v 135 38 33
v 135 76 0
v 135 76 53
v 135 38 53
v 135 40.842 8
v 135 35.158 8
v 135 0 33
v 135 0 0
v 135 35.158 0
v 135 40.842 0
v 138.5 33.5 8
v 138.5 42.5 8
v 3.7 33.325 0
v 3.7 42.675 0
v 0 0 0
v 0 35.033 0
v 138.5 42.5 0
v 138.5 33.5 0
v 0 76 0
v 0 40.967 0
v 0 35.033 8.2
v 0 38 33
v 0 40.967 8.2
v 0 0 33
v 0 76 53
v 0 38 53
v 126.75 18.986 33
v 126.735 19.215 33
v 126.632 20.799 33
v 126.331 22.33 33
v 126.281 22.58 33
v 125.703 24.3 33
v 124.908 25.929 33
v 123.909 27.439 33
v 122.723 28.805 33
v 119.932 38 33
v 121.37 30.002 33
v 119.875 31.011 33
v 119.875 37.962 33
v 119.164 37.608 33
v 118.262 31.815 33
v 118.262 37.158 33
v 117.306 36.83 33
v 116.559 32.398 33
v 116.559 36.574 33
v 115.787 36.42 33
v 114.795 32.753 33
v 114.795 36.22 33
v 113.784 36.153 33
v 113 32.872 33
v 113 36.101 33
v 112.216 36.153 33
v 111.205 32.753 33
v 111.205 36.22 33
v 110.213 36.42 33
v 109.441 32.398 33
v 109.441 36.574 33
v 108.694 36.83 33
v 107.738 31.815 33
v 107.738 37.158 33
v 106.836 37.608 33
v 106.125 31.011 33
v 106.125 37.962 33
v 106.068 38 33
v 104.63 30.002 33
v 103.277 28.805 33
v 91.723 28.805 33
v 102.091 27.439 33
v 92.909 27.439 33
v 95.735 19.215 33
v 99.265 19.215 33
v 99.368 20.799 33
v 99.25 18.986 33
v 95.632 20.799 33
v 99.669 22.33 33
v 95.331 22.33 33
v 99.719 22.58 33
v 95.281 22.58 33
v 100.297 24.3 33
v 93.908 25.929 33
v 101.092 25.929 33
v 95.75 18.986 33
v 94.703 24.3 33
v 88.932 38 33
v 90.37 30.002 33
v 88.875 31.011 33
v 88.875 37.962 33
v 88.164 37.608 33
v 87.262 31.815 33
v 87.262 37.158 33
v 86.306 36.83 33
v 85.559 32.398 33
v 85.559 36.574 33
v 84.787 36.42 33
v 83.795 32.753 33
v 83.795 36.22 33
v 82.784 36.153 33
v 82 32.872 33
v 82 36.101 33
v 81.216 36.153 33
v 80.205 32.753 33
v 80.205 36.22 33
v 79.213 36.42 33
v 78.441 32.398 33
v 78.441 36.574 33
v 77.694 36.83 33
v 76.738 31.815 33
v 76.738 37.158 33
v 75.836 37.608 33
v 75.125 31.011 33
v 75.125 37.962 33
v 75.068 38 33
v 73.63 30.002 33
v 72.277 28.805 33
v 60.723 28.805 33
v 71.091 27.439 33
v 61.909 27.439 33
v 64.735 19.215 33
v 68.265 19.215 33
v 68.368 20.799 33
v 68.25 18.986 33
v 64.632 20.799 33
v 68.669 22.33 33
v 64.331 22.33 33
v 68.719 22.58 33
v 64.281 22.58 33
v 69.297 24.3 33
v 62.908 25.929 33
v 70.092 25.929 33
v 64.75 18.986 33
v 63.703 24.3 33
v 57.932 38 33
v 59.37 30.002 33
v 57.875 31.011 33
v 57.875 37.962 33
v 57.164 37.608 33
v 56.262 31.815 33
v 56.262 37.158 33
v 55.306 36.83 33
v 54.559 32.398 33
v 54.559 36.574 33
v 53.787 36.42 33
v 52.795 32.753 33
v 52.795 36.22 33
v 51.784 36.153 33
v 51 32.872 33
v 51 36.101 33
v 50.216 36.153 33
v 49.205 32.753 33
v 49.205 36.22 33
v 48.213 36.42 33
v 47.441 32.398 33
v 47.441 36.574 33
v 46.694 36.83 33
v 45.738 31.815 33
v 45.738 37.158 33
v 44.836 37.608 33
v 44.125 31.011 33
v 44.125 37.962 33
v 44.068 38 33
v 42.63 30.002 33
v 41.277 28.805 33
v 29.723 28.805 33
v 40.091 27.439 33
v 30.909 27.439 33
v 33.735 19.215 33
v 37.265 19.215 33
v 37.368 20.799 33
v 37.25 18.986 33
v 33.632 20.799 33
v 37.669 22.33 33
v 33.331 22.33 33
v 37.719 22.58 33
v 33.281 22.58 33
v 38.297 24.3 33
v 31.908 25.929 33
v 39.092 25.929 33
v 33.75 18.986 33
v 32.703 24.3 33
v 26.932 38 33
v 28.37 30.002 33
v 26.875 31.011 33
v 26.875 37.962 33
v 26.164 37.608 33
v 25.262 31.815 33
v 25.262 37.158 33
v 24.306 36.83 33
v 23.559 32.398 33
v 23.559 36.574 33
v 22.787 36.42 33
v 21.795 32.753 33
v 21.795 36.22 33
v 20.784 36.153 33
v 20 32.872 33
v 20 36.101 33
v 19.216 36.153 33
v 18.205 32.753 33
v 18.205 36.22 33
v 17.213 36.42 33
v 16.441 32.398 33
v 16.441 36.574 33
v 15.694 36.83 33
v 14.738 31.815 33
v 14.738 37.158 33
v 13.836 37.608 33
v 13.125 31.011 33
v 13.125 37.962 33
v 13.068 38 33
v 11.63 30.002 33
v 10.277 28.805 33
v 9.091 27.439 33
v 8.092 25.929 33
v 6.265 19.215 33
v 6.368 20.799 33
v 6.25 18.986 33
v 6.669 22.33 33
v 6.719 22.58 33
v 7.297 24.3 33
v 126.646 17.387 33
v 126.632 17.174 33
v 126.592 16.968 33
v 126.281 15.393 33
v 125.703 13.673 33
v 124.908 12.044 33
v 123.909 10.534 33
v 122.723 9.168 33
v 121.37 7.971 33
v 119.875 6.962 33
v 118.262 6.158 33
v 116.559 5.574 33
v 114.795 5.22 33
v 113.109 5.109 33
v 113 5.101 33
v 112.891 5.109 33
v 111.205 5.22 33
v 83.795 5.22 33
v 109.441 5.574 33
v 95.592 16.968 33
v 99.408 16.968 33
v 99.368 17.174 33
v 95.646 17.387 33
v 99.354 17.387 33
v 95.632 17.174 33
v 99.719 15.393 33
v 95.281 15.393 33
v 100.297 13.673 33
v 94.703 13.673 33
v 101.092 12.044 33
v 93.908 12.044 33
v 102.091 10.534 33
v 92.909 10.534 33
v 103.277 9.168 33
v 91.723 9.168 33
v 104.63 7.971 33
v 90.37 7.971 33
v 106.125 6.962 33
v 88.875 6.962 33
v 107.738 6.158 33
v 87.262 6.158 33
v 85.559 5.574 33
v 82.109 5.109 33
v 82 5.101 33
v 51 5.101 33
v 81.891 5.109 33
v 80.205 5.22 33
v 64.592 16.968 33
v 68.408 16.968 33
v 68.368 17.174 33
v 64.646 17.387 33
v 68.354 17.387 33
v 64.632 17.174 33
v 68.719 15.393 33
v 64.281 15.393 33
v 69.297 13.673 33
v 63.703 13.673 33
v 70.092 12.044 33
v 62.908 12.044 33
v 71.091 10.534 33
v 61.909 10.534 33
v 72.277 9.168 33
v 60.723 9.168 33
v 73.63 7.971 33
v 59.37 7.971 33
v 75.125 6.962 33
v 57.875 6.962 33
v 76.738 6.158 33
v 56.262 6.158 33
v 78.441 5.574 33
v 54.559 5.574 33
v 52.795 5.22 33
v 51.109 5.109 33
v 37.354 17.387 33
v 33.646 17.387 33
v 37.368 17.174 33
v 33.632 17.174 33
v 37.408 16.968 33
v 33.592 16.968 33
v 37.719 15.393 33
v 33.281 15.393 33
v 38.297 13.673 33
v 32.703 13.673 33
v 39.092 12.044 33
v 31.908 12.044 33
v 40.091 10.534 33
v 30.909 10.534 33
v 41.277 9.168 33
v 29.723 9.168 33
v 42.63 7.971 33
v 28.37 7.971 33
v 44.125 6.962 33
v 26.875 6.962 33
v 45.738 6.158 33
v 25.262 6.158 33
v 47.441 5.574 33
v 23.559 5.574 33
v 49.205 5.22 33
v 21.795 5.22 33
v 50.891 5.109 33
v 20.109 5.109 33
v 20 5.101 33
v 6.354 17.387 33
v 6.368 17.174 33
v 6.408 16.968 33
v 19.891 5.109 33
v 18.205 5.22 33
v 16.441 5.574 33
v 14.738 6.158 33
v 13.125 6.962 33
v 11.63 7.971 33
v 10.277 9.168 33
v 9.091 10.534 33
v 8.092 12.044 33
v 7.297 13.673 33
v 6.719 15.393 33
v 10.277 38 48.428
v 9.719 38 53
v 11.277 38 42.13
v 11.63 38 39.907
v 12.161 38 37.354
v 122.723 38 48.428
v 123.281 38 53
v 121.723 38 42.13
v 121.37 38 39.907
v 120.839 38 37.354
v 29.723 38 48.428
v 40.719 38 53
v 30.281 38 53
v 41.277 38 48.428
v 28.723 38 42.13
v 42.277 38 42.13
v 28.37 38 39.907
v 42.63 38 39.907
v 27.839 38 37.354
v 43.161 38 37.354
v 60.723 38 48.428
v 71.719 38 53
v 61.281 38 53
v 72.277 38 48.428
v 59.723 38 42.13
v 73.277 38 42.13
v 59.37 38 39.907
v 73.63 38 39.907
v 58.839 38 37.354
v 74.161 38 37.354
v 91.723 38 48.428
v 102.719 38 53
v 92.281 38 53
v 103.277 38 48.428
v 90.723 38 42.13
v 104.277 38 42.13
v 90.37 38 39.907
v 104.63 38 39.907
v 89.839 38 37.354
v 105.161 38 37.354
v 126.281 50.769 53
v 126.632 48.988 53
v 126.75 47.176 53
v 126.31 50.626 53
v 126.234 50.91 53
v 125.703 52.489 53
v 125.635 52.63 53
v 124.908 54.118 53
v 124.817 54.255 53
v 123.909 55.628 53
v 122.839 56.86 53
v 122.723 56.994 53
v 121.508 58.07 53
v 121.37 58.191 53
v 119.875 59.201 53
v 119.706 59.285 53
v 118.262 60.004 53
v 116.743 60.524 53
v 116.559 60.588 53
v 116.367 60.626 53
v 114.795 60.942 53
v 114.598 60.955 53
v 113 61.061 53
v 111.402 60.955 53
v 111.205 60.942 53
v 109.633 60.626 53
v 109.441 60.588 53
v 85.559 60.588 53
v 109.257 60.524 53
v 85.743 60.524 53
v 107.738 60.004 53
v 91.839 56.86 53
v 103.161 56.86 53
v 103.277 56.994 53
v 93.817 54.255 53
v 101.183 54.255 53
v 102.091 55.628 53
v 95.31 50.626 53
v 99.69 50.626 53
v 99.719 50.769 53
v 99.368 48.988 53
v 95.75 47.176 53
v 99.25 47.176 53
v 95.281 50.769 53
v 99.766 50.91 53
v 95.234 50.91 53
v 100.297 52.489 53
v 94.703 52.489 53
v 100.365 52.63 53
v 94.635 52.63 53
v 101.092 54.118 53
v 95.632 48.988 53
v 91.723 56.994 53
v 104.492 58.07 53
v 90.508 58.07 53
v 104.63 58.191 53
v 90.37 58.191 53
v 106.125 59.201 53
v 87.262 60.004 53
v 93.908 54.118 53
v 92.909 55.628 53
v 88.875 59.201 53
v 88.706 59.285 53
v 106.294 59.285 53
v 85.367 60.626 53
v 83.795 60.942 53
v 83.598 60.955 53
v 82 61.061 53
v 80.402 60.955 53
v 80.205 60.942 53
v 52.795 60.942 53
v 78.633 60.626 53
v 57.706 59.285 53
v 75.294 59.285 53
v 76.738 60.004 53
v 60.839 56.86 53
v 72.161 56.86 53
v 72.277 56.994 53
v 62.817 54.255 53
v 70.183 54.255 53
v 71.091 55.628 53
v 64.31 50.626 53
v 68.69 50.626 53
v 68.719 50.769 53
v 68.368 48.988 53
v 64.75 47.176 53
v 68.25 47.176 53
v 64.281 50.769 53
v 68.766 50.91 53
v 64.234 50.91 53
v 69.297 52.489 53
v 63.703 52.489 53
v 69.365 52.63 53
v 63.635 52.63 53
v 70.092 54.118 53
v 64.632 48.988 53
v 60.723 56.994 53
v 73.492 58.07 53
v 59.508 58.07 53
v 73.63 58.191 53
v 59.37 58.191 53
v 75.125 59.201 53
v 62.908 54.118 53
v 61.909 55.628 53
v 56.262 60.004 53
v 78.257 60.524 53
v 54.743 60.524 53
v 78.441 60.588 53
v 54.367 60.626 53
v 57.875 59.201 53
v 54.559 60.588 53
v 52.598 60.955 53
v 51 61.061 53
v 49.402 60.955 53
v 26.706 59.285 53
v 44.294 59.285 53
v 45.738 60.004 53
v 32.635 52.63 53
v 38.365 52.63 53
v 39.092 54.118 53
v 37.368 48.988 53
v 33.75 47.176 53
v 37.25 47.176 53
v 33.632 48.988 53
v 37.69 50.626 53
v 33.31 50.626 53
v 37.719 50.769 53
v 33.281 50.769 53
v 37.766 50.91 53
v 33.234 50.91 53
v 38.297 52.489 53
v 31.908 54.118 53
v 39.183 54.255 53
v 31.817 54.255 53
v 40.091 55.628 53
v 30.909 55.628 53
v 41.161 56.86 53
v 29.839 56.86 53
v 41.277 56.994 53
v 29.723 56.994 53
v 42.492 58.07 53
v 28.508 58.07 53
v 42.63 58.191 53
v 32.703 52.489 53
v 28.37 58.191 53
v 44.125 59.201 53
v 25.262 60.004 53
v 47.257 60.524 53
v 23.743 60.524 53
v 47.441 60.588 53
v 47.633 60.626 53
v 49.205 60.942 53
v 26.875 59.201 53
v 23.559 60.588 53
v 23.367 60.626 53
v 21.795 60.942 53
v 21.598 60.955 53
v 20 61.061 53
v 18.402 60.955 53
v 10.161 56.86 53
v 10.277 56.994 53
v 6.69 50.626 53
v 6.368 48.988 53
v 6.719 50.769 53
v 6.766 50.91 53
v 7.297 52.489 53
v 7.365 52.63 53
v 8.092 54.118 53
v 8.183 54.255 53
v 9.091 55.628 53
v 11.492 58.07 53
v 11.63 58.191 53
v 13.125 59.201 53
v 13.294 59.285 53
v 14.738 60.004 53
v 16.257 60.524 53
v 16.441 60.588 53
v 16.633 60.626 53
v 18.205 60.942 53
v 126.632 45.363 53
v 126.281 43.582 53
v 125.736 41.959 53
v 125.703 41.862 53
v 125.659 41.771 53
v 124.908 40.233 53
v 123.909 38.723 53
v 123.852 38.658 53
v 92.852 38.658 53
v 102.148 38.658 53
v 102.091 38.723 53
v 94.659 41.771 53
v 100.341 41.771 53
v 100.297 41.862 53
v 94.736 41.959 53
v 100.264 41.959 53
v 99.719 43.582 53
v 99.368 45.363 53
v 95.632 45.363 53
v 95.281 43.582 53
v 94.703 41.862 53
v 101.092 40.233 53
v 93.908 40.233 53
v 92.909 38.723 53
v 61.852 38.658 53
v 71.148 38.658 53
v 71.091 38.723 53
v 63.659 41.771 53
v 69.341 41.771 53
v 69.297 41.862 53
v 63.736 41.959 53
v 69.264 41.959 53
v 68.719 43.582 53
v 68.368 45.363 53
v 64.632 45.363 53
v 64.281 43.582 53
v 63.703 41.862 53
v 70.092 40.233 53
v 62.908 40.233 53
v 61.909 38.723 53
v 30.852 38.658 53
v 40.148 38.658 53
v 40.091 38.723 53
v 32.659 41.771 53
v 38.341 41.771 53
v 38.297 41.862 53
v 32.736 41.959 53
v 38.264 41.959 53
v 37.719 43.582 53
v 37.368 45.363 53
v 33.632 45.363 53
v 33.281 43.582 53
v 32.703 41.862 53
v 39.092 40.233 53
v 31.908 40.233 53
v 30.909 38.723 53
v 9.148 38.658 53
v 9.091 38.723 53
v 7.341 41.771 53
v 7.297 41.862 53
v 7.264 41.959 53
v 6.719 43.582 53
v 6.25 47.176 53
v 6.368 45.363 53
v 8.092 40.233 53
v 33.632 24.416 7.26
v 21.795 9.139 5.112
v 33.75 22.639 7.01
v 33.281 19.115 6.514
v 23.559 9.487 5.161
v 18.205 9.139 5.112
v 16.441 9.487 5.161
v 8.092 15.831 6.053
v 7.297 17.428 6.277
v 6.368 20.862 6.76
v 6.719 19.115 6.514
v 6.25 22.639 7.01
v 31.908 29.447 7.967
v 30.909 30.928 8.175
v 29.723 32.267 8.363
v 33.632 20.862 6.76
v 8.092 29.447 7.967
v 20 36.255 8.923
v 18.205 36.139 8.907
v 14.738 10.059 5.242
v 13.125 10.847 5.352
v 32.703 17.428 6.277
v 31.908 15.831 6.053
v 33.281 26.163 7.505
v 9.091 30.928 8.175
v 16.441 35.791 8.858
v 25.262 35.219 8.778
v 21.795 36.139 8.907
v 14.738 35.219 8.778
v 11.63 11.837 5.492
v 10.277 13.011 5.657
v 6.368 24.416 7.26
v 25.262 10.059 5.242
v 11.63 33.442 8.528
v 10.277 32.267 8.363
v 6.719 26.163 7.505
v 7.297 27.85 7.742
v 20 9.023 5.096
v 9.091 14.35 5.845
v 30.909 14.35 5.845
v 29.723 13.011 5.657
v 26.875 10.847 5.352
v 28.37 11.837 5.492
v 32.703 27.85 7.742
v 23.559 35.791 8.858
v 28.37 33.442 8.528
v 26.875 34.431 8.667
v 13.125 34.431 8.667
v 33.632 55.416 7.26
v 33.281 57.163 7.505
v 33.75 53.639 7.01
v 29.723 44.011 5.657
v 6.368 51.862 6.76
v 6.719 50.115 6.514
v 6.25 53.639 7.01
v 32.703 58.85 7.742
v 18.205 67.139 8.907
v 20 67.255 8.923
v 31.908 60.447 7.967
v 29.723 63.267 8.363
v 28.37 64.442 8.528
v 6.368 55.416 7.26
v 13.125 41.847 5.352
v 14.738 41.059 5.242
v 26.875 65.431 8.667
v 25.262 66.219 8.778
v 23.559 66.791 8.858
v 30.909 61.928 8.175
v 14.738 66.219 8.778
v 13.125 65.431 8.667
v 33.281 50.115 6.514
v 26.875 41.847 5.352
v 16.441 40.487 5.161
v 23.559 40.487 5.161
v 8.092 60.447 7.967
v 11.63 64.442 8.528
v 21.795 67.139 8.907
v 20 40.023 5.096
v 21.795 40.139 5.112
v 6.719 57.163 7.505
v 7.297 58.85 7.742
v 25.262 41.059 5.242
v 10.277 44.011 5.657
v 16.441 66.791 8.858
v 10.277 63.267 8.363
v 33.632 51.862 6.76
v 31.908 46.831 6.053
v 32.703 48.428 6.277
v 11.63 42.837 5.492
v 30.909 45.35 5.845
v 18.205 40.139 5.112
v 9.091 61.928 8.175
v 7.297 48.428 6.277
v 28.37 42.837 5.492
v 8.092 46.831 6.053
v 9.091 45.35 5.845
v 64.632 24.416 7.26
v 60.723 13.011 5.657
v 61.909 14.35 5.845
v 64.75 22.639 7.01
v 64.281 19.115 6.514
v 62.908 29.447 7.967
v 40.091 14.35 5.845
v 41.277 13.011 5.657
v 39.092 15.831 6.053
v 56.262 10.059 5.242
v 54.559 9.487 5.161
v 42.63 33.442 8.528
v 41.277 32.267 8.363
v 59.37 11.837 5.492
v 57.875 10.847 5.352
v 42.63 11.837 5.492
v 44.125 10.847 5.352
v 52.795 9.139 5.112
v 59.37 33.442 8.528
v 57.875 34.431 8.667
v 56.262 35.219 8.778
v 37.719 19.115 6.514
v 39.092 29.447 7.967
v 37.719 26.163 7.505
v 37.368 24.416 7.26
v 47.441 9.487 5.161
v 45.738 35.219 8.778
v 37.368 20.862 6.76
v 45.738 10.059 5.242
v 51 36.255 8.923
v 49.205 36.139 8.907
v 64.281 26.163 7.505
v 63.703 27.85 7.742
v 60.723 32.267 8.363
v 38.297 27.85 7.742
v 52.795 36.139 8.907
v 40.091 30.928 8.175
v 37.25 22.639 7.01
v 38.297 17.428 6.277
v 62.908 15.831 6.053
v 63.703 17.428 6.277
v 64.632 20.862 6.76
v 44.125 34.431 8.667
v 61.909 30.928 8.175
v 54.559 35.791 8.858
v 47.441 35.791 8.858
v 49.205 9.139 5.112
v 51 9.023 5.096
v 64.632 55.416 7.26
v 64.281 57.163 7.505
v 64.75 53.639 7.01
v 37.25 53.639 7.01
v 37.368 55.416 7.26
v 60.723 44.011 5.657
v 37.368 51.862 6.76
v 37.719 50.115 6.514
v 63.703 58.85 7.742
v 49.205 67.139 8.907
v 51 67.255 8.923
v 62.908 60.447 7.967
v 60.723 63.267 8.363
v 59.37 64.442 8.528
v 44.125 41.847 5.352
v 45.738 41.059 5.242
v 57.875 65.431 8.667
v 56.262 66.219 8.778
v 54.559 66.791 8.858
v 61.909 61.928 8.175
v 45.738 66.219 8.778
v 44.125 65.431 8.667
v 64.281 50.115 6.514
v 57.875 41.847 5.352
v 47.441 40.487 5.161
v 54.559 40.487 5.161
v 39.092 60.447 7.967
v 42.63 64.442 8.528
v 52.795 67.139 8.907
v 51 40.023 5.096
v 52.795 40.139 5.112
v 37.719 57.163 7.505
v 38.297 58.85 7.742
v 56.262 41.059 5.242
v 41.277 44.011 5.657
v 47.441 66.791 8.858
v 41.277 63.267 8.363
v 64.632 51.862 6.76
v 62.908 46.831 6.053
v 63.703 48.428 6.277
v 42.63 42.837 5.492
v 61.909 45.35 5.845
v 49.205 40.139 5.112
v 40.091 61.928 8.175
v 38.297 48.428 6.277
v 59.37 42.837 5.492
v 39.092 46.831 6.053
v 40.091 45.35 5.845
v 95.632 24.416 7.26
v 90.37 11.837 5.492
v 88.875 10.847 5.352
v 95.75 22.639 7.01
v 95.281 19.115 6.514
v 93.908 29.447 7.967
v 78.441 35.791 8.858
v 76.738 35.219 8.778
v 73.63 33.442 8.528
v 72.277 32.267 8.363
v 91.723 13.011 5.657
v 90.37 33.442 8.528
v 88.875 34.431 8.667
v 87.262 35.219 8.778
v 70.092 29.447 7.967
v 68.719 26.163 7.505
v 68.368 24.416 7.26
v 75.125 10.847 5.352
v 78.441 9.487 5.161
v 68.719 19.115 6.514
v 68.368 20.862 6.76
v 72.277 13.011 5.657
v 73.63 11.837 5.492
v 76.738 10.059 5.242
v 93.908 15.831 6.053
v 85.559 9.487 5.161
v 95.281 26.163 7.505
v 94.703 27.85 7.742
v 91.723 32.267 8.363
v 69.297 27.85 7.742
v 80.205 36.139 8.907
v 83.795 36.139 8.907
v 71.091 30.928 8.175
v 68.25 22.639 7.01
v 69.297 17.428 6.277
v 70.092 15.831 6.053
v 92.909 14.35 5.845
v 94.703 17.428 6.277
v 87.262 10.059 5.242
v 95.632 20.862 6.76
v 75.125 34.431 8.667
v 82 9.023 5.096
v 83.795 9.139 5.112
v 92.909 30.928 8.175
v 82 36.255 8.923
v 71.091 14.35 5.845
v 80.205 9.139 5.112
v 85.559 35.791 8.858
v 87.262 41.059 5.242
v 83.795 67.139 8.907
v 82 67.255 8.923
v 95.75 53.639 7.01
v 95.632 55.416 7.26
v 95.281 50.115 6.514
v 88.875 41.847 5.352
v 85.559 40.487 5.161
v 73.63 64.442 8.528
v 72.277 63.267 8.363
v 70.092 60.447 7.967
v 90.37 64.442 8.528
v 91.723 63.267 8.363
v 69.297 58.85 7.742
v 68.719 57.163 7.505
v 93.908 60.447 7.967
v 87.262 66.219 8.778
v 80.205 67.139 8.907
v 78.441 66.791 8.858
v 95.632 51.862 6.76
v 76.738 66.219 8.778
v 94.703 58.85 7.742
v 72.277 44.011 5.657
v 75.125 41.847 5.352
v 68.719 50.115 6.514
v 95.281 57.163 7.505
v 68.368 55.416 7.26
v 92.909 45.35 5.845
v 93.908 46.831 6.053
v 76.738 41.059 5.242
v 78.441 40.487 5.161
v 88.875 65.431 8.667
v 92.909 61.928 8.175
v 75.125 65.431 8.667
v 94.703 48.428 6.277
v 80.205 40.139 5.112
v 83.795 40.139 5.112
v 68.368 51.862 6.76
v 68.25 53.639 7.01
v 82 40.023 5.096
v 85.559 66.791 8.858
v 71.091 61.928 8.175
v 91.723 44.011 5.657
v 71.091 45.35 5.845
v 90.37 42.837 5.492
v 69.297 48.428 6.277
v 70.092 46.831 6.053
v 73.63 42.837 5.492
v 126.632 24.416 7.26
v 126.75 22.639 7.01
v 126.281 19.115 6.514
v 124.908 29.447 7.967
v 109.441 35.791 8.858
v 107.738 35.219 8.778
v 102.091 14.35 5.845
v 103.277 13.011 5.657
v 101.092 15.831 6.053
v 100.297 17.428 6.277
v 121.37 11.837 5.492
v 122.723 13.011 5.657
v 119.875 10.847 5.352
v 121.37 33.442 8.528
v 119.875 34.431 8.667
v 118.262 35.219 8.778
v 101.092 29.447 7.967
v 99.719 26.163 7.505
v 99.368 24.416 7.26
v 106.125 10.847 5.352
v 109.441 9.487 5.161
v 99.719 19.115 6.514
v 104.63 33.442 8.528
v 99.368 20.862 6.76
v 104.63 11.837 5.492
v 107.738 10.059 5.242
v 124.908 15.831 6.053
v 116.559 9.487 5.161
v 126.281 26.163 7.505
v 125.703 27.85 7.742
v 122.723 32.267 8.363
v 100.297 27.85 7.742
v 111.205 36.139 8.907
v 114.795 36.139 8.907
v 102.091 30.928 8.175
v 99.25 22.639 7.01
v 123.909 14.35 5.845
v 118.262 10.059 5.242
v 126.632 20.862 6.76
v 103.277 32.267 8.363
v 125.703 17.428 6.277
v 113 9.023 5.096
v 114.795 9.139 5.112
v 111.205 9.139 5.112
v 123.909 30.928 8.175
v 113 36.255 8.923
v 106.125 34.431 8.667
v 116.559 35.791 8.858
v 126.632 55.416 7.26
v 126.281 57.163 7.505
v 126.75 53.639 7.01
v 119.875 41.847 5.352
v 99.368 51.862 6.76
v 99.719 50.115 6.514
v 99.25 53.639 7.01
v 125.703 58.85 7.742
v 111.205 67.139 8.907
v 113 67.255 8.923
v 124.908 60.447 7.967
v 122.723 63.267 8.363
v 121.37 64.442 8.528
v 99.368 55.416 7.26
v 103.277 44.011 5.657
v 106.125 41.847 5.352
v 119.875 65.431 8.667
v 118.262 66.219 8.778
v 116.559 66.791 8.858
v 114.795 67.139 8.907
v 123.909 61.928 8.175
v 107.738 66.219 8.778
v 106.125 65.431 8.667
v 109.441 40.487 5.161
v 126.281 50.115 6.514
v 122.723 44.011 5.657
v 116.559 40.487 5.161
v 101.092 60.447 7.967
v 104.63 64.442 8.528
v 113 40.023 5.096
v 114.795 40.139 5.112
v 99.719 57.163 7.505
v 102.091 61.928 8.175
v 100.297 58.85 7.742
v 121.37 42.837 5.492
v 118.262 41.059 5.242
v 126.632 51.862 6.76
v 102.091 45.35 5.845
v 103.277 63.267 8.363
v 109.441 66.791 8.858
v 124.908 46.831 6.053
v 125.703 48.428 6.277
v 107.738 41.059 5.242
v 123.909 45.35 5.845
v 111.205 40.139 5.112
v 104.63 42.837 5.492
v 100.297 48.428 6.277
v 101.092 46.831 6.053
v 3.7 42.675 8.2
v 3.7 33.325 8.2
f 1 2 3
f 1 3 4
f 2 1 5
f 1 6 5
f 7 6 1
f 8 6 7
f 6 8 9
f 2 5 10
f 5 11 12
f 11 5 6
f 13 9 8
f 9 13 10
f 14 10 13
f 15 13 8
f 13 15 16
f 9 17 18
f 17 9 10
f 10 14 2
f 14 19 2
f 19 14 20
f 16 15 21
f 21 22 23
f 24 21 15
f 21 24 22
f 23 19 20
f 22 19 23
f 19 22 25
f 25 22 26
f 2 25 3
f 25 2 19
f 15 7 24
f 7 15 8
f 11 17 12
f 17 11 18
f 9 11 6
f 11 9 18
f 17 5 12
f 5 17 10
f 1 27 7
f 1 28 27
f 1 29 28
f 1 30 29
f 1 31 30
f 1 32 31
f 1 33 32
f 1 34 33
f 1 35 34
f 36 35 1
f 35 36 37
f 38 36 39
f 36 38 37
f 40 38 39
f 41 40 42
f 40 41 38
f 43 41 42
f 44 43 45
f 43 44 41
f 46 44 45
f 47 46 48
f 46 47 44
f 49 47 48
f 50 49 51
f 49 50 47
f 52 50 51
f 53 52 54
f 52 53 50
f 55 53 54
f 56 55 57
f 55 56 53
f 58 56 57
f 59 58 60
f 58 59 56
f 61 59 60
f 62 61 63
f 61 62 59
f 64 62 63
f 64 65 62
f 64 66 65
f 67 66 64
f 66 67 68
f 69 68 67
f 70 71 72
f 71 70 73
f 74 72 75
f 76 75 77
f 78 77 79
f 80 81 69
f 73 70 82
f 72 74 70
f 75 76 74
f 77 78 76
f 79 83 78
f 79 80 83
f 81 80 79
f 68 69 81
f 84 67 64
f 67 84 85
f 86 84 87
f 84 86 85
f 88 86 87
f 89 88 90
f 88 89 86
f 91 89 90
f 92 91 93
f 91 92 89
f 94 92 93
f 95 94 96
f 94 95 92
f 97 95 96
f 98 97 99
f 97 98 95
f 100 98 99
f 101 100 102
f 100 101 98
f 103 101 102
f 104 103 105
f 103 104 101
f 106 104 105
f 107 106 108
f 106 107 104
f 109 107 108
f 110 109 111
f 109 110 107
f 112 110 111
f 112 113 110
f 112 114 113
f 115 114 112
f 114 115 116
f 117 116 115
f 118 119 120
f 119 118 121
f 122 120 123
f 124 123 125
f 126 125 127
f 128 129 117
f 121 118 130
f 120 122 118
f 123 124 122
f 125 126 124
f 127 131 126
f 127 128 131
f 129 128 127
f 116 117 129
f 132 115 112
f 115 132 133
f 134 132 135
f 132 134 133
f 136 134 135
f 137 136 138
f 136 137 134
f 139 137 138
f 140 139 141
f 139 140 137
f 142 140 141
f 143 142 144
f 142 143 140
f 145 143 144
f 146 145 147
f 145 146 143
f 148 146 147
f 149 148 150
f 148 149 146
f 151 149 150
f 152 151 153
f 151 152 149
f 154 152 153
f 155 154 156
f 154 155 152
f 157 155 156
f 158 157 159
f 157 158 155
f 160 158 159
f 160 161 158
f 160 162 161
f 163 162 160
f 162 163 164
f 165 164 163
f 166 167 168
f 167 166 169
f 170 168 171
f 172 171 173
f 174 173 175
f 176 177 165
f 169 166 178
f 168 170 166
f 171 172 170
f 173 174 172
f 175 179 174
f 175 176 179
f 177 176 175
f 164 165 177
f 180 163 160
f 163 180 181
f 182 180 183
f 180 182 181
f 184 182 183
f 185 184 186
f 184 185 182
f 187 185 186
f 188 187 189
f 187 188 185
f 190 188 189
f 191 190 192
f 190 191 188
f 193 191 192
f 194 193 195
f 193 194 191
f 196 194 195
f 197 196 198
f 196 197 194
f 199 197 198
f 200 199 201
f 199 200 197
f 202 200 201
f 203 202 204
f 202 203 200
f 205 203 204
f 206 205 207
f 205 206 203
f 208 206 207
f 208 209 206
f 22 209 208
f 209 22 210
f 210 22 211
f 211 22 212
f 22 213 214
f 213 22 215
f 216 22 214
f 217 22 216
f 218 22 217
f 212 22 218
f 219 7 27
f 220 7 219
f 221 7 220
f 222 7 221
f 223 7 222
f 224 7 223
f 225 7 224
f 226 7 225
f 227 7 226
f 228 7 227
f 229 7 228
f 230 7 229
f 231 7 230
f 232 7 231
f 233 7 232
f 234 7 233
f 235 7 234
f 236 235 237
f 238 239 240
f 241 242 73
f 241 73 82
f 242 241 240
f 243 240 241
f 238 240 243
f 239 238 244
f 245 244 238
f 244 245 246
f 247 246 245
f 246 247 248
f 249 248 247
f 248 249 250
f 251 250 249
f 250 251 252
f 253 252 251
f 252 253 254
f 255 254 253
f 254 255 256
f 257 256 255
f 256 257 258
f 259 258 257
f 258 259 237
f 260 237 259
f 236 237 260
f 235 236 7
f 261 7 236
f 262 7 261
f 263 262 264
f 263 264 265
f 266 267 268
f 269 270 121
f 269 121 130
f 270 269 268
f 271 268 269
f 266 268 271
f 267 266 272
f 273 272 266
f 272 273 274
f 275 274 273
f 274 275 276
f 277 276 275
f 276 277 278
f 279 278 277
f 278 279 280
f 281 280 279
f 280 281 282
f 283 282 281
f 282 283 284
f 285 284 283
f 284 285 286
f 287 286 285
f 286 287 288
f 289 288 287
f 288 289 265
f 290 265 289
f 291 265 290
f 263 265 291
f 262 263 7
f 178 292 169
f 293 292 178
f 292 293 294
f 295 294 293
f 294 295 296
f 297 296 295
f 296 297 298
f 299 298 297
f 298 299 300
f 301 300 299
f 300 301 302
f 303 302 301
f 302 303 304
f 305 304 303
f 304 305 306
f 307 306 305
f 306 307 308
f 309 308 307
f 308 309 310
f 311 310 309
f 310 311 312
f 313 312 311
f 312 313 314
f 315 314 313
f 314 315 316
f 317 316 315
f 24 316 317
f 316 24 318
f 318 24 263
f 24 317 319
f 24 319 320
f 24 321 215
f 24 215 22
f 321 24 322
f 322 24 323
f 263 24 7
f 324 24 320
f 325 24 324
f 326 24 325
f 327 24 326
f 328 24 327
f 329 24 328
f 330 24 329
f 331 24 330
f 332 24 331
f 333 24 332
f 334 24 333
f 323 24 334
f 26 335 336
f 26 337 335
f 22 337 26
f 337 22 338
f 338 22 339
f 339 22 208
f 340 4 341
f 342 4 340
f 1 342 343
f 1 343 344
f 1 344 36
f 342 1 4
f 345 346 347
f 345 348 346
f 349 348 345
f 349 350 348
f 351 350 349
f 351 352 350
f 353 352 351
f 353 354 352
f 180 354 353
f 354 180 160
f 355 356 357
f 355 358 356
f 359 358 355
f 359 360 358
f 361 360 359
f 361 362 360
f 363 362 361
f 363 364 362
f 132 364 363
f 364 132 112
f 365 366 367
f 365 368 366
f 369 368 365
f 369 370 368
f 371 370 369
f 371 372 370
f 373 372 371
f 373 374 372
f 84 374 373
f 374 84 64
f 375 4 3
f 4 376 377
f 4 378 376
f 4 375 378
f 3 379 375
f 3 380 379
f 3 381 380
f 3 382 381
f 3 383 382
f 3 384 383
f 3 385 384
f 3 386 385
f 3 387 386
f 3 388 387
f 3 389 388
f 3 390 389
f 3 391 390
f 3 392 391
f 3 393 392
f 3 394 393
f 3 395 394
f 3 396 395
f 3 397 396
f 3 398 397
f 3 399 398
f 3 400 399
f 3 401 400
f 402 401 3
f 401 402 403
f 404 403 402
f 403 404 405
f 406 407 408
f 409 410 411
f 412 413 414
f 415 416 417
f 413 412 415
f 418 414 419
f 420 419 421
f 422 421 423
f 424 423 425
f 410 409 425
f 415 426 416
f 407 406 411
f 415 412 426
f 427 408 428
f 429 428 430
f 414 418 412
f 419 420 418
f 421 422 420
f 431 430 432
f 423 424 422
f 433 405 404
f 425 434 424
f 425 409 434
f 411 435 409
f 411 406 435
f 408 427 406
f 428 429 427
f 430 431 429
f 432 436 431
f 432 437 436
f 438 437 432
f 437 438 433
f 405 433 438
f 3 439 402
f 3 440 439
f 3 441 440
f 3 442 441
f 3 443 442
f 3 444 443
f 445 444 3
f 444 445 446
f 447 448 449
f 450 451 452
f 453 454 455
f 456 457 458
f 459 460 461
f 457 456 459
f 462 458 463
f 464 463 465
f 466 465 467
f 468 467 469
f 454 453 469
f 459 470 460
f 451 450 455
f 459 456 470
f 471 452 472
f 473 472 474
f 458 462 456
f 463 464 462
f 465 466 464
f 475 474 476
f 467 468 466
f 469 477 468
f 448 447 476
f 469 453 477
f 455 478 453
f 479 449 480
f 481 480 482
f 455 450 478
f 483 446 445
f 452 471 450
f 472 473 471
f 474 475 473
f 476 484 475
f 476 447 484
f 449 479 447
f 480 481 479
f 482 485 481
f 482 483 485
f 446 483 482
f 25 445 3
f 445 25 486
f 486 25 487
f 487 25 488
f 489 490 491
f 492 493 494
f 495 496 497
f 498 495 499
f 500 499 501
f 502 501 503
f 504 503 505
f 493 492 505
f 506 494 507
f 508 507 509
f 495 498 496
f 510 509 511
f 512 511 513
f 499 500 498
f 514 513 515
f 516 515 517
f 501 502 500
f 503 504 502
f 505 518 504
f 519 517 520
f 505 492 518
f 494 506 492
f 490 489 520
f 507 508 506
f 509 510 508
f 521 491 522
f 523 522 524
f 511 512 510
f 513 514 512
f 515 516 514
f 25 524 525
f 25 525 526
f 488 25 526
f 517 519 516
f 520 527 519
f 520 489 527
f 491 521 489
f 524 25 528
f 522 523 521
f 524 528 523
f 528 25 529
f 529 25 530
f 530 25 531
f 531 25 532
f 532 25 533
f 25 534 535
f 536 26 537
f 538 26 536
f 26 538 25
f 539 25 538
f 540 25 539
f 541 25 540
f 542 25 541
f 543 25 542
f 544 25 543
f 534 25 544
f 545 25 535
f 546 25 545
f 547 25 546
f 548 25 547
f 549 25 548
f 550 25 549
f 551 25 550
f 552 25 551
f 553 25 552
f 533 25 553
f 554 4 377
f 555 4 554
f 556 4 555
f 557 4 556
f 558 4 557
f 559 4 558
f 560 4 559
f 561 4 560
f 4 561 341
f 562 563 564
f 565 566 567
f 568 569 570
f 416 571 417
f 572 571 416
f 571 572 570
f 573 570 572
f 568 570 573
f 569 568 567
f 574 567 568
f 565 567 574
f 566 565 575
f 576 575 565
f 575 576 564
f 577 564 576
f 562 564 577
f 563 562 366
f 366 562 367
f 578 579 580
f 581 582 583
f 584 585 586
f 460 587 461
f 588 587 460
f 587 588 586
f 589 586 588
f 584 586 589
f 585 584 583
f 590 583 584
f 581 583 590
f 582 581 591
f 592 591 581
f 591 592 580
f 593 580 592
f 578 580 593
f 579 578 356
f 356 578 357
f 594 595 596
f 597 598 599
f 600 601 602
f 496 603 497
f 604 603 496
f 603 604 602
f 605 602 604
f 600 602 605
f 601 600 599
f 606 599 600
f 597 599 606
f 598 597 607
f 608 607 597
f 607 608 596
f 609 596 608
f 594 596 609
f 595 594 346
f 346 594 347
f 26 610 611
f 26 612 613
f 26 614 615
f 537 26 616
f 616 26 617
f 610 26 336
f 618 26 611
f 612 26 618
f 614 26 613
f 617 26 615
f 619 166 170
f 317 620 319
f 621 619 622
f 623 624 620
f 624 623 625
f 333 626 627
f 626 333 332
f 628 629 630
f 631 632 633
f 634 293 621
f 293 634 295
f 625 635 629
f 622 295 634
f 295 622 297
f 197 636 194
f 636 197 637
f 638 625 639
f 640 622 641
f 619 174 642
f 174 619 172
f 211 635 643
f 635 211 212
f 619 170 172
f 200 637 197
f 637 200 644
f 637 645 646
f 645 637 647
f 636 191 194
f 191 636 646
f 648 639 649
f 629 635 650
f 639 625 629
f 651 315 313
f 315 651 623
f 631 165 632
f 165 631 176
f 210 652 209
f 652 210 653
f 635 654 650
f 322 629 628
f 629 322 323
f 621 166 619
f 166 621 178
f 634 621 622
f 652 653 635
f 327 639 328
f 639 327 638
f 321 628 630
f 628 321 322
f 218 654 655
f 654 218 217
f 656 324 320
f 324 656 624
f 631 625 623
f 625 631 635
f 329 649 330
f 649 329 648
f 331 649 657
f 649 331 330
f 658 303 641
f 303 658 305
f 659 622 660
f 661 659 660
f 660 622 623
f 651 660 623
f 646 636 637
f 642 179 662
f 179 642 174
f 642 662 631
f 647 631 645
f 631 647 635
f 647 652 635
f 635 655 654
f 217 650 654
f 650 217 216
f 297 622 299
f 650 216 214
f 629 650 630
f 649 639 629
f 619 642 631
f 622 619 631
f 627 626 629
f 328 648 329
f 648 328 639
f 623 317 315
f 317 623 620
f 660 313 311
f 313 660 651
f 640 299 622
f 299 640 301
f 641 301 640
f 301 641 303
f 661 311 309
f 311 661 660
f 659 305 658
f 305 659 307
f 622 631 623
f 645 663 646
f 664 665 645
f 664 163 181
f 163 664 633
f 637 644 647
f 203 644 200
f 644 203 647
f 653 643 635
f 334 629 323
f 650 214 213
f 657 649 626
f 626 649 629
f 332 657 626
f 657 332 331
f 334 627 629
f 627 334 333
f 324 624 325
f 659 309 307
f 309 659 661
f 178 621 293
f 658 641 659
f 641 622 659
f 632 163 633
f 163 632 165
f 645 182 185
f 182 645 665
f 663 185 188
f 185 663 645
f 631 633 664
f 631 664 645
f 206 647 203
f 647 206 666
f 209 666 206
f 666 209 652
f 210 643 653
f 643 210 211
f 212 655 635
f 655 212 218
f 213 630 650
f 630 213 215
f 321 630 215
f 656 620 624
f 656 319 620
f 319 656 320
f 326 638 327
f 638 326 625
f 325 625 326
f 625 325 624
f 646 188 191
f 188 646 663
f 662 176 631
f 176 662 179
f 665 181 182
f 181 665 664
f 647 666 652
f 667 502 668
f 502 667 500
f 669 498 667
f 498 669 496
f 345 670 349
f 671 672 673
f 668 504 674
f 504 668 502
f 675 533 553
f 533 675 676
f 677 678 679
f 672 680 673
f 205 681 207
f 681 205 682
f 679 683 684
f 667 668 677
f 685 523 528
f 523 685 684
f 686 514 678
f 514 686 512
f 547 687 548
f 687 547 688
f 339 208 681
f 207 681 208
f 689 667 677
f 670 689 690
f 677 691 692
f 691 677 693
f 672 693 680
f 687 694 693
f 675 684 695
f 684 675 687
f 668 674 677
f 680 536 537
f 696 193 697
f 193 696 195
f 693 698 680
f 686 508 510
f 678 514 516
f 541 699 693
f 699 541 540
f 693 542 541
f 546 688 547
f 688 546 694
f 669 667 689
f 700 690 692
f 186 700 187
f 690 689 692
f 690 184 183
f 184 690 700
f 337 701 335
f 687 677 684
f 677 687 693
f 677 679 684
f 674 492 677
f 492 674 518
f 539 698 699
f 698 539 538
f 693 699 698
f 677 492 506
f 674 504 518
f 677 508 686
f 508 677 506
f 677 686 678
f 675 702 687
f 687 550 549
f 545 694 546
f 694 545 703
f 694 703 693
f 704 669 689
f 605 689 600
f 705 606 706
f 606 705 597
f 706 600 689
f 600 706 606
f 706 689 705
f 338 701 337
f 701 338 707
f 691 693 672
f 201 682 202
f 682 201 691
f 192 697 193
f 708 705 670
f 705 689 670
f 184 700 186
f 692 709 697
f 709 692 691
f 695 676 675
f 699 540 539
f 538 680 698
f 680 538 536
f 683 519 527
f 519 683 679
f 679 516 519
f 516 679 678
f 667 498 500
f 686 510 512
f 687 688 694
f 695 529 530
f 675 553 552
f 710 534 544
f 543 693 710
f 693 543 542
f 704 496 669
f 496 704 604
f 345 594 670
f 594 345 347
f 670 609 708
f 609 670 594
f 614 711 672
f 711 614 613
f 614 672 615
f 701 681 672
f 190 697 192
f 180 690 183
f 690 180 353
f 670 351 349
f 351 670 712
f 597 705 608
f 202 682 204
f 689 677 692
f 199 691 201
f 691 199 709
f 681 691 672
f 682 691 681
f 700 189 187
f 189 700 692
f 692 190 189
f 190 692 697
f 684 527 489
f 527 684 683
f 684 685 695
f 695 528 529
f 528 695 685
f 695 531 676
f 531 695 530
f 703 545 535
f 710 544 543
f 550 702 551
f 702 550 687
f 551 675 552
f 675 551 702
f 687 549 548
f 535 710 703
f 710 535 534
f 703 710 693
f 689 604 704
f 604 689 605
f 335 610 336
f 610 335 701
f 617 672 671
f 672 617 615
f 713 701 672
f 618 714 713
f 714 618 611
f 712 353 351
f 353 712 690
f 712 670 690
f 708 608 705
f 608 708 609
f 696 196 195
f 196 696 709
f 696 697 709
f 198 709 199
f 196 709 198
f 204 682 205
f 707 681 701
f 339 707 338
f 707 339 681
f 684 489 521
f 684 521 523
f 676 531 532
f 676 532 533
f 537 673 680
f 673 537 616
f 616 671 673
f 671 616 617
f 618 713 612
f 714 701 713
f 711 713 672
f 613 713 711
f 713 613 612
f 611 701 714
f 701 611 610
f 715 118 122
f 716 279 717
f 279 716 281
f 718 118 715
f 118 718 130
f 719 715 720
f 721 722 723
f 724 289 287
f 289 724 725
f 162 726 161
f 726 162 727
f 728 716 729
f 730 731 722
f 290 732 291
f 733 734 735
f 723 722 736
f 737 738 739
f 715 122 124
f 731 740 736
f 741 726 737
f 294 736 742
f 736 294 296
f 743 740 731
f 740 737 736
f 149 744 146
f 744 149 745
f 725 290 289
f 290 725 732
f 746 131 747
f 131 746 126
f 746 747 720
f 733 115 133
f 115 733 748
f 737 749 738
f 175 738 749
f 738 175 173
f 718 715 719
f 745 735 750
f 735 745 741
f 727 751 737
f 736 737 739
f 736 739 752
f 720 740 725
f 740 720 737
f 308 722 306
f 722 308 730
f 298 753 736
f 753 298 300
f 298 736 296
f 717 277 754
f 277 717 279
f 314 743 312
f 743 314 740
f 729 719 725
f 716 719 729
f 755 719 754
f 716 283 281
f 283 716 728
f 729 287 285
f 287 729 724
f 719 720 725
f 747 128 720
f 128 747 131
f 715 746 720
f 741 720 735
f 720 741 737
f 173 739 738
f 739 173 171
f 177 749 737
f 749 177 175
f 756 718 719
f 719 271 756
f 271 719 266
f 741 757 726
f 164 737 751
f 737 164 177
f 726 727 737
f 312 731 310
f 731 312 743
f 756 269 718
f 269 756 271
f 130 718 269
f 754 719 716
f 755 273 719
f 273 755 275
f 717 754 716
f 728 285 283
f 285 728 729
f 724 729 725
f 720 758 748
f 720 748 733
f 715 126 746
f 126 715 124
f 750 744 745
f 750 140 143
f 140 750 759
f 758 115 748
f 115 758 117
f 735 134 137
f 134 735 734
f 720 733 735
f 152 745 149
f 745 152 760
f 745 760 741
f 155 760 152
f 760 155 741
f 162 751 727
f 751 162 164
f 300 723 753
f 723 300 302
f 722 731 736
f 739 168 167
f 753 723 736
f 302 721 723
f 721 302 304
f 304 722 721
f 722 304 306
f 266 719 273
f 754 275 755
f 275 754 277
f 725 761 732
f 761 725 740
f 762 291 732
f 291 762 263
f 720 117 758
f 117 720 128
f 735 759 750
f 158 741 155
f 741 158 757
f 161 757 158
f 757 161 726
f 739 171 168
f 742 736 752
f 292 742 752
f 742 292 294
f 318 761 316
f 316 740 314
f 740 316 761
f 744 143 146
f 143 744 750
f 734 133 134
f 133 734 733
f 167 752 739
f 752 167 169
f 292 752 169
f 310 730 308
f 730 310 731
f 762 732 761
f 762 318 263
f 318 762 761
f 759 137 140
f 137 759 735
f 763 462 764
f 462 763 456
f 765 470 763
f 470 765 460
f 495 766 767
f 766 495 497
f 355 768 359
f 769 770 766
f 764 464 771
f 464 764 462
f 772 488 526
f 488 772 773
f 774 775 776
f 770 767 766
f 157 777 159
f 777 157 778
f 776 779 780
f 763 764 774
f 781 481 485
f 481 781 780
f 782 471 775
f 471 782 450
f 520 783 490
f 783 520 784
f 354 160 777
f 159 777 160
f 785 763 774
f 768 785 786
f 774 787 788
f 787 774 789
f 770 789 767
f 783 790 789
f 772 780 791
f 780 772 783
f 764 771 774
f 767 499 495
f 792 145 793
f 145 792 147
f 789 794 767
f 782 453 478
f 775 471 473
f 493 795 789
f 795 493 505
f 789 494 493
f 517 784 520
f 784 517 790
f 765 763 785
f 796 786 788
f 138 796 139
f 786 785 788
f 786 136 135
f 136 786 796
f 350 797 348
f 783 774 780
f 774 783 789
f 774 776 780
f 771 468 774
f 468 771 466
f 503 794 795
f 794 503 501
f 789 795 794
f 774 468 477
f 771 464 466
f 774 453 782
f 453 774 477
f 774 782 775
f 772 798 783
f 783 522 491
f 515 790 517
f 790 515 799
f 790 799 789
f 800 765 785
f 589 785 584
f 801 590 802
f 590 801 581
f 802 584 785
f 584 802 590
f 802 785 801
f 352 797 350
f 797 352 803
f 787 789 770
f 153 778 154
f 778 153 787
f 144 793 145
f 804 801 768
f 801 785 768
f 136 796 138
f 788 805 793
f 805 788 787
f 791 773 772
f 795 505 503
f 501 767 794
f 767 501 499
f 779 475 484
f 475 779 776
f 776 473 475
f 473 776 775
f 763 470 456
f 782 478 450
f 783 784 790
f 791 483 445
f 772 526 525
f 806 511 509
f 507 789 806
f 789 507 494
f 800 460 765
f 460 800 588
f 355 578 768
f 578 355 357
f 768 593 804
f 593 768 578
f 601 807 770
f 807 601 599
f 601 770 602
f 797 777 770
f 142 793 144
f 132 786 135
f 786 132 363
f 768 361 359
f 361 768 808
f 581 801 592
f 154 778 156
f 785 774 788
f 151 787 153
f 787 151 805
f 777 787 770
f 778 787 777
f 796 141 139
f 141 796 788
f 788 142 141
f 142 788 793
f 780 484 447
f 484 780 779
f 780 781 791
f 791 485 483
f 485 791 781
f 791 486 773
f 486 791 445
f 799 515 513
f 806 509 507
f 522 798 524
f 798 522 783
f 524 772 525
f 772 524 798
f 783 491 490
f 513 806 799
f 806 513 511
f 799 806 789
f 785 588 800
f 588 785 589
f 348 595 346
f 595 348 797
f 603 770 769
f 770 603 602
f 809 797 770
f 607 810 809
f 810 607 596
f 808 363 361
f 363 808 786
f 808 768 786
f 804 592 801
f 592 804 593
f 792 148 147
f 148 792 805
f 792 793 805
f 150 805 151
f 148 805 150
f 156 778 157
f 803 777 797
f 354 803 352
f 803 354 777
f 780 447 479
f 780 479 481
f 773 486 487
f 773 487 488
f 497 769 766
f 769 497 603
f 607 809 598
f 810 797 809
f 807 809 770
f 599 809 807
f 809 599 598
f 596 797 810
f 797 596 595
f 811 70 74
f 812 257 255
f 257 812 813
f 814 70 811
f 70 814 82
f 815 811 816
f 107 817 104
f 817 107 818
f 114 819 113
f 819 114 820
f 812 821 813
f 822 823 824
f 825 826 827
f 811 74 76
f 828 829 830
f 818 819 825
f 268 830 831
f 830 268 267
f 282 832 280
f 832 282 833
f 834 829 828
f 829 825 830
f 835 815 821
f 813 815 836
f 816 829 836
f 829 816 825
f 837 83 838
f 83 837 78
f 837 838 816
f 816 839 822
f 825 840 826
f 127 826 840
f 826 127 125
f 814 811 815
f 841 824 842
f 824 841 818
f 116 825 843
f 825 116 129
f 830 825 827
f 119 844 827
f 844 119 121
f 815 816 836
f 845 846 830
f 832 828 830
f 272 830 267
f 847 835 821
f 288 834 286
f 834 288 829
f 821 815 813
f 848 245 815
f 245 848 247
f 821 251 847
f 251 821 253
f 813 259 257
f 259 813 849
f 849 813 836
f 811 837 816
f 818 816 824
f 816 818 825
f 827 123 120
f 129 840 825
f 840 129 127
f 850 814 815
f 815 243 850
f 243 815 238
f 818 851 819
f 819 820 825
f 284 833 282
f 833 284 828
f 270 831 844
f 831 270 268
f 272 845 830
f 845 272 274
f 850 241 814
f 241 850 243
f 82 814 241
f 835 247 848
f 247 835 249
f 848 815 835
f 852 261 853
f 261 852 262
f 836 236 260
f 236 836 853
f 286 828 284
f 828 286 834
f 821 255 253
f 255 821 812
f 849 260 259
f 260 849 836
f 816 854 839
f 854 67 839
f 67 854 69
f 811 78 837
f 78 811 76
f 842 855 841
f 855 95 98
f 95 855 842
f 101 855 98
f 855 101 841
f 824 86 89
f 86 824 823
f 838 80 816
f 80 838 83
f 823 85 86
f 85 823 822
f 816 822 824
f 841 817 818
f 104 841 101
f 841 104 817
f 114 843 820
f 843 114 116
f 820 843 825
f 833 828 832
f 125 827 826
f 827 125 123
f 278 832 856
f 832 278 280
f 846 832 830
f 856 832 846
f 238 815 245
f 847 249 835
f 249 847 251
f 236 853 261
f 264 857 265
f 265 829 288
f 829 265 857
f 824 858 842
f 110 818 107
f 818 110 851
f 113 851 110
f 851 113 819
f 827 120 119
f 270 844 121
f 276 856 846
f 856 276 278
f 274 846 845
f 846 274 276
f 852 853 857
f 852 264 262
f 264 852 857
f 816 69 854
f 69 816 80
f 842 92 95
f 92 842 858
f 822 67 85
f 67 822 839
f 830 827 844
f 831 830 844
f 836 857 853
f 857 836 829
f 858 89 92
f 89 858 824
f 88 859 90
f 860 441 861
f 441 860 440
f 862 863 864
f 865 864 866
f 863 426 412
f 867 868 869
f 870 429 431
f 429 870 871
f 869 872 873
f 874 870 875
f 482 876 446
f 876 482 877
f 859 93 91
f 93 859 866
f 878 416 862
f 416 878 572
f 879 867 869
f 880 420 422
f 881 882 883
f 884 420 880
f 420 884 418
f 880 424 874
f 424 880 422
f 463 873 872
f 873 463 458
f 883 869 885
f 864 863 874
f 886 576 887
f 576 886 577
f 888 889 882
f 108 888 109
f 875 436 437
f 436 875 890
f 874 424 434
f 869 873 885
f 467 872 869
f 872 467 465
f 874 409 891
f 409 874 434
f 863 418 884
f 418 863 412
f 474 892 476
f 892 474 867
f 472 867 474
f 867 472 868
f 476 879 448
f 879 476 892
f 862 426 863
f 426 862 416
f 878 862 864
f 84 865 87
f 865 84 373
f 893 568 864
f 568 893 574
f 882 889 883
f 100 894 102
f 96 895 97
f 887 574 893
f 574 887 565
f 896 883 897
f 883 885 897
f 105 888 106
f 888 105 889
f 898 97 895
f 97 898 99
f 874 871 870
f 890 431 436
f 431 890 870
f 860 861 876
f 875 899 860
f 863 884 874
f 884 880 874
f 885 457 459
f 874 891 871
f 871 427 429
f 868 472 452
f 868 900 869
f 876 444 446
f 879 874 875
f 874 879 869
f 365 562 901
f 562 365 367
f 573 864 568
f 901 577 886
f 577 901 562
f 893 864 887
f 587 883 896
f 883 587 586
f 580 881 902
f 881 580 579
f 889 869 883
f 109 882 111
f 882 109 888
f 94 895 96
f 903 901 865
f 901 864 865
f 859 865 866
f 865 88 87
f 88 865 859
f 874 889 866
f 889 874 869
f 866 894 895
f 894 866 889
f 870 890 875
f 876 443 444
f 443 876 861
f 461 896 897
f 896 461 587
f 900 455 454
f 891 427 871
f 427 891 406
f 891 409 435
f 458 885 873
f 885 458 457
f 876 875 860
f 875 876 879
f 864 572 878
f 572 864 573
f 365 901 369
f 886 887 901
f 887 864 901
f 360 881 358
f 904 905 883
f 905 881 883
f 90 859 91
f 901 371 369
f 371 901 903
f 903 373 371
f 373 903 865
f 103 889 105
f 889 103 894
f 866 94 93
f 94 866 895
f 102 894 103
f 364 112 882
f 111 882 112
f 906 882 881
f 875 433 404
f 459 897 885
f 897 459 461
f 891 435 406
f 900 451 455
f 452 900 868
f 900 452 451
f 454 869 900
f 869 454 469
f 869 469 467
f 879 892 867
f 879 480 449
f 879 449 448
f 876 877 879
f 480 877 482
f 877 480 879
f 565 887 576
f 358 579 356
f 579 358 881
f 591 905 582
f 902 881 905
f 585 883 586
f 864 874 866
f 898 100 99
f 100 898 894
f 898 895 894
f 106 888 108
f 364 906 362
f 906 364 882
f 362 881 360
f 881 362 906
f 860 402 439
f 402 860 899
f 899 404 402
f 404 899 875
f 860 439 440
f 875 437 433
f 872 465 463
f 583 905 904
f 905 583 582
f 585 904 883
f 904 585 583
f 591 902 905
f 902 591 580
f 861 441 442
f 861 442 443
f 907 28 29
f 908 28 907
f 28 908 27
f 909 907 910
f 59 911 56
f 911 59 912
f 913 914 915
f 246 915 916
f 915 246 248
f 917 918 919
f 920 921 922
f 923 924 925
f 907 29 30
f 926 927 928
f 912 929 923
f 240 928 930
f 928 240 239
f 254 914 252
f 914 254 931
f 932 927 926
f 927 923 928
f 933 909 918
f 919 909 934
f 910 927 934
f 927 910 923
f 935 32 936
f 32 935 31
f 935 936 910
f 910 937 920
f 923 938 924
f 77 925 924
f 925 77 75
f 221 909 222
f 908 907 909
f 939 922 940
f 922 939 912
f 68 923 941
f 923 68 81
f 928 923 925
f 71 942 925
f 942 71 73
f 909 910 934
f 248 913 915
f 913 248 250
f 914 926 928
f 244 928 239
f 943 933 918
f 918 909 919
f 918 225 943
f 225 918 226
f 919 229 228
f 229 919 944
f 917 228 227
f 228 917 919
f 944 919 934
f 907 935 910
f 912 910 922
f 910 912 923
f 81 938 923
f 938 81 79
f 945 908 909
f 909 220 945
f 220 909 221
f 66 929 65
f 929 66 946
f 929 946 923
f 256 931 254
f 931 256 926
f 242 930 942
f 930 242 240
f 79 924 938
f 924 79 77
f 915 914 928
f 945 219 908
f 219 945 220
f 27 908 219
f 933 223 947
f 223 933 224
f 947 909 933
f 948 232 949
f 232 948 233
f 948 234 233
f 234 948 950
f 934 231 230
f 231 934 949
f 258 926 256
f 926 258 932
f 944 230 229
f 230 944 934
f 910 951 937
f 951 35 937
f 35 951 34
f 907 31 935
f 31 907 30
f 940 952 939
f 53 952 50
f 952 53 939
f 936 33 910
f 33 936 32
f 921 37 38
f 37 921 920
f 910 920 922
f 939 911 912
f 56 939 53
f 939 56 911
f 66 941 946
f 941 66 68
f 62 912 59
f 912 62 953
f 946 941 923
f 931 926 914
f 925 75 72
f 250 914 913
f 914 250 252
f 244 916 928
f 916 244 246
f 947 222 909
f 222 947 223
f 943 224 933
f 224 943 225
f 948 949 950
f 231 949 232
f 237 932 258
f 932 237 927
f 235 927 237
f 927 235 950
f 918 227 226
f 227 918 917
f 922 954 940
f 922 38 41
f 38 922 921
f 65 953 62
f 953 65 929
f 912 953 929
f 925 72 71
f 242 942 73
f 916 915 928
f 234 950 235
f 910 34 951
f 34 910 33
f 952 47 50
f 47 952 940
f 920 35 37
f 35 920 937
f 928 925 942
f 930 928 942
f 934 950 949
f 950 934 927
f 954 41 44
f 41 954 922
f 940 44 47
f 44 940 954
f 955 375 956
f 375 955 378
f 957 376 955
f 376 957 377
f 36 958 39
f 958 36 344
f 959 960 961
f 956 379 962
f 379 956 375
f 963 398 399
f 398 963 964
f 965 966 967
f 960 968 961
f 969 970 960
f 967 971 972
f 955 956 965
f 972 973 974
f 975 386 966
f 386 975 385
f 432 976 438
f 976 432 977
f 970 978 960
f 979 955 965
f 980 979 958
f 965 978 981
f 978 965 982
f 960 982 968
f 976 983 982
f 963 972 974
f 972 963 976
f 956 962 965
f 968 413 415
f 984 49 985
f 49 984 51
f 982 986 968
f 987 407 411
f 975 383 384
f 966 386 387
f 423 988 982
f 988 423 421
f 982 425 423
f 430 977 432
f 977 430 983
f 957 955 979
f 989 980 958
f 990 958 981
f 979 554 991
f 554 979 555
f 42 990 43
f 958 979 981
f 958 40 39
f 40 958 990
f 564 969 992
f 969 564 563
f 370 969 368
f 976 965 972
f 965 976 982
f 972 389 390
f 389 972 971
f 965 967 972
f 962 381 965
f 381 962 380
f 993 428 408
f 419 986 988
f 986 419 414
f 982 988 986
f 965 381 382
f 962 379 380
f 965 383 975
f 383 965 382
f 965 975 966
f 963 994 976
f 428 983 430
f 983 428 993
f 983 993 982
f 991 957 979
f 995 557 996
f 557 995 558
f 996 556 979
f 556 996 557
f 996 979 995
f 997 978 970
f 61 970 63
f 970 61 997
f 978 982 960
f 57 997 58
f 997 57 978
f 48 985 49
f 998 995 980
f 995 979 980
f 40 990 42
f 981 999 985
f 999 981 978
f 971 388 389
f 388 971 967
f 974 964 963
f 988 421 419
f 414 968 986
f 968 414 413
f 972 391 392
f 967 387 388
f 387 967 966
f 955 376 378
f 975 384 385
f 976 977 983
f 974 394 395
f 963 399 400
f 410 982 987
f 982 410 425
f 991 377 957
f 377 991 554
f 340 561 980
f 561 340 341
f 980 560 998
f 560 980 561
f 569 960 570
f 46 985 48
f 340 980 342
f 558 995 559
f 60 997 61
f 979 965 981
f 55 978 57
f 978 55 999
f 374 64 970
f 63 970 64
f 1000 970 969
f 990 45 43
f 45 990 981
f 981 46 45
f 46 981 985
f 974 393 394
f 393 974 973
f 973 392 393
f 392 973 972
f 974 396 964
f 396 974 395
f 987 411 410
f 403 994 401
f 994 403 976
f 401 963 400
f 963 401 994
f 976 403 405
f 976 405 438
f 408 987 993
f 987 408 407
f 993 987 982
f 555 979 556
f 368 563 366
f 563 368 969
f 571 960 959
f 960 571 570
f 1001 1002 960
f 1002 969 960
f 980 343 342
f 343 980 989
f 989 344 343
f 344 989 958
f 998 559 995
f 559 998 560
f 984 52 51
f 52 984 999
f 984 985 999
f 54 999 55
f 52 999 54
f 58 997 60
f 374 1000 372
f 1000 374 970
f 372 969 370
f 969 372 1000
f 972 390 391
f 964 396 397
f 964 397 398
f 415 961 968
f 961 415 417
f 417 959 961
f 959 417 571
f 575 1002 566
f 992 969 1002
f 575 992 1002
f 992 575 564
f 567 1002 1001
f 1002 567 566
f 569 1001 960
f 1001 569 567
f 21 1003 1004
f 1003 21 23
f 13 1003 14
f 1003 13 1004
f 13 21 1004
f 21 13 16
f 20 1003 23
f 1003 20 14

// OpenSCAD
// file: ../lib/connector.scad
// lib/connector.scad — shared dovetail edge profile + base plinth.
// Extruded along Z with a constant XY cross-section, so two modules
// assemble by setting one down from above (tab drops into slot with
// zero collision at any height); once seated, the flare traps the tab
// against sideways separation. See docs/PROJECT-SPEC.md for the
// connector spec this implements.

module dovetail_tab(width=9, depth=3.5, height=8) {
    // Root extends 0.3mm behind x=0 so the tab always has real
    // volumetric overlap with whatever it's unioned onto, rather than
    // touching at a single coincident face (which CGAL can render as
    // two disjoint volumes instead of one fused solid).
    neck_w = width * 0.6;
    linear_extrude(height=height)
        polygon(points=[
            [-0.3, -neck_w/2],
            [-0.3, neck_w/2],
            [depth, width/2],
            [depth, -width/2]
        ]);
}

module dovetail_slot(width=9, depth=3.5, height=8, clearance=0.175) {
    neck_w = width * 0.6 + 2*clearance;
    tip_w  = width + 2*clearance;
    translate([0, 0, -0.2])
        linear_extrude(height=height + 0.4)
            polygon(points=[
                [-0.2, -neck_w/2],
                [-0.2, neck_w/2],
                [depth + 0.2, tip_w/2],
                [depth + 0.2, -tip_w/2]
            ]);
}

// Places a tab centered on a Y-running edge of the given length,
// protruding in +X from x=0. Call with translate() to position at the
// actual edge of your module's footprint.
module edge_tab(edge_length, width=9, depth=3.5, height=8) {
    translate([0, edge_length/2, 0])
        dovetail_tab(width=width, depth=depth, height=height);
}

module edge_slot(edge_length, width=9, depth=3.5, height=8, clearance=0.175) {
    translate([0, edge_length/2, 0])
        dovetail_slot(width=width, depth=depth, height=height, clearance=clearance);
}

module base_plinth(footprint_x, footprint_y, height=8) {
    cube([footprint_x, footprint_y, height]);
}
// file: ../config.scad
// config.scad — single source of truth for every physical dimension
// used across modules/. Status tags match docs/PROJECT-SPEC.md's
// Parameters table: MEASURED (trust it), SOURCE (verify with calipers
// before printing), MEASURE (blocked, no real value exists yet).

// Connector geometry — DECIDED, shared across all modules
tab_width           = 9;     // mm, spec range 8-10mm
tab_depth           = 3.5;   // mm, spec range 3-4mm
tab_clearance       = 0.175; // mm per side, spec range 0.15-0.2mm
base_plinth_height  = 8;     // mm, shared plinth height across all modules

// Physical measurements
bottle_diameter = 26;    // mm — SOURCE: LITKO Game Accessories manufacturer
                          // fit table (litko.net/pages/paint-racks) — 26mm
                          // hole fits Vallejo 17-18ml, Army Painter
                          // Warpaints/Fanatic/Speedpaint, AK Interactive 3rd
                          // Gen, Scale75, Reaper MSP, Two Thin Coats
                          // (bottles "about 25mm across"). Replaces an
                          // earlier 28mm single-listing (Vallejo 20ml) proxy.
well_clearance  = 0.75;  // mm per side — SOURCE: community guidance range
                          // 0.5-1mm for a bottle pulled in/out by hand, vs.
                          // tab_clearance's 0.15-0.2mm which is tuned for a
                          // printed-in-place snap connector. Wells use this,
                          // never tab_clearance.
handle_width    = 10;    // mm — MEASURED: user's brush set
brush_length    = 220;   // mm — MEASURED: user's brush set
marker_diameter = undef; // MEASURE: no marker product selected yet — blocks modules/marker_holders.scad
// main file
// modules/bottle_row.scad — 2-row "stadium" tiered bottle rack: back
// row's collar is taller than the front row's so both rows' labels
// stay visible from the front, matching the functional layout of
// commodity tiered paint racks (see docs/superpowers/specs/2026-09-11-
// tiered-bottle-rack-design.md) rather than a flat single row.
//
// The shared base_plinth is just the connector-alignment floor (per
// docs/PROJECT-SPEC.md: modules share a flush plinth while having
// "differing upper geometry") — wells are cut into two separate collar
// blocks built on top of it, not into the thin plinth itself.
//
// The step between the two collar heights needs NO angled/sloped face:
// two flat-topped rectangular blocks of different heights sitting side
// by side are both just straight vertical prisms — every surface is
// either vertical (backed by solid material) or a horizontal ledge
// resting on solid material below it. Nothing overhangs.
include <../config.scad>
use <../lib/connector.scad>

footprint_x     = 135;  // unchanged from the single-row design — still
                         // fits 4 wells per row at well_spacing below,
                         // still far under the 180mm bed edge.
footprint_y     = 76;   // DECIDED: fits front margin + front well +
                         // row divider + back well + back margin (see
                         // row_margin below) for both rows' depth.
                         // Solved so row_margin lands close to the
                         // original single-row design's ~8.3mm edge
                         // margin.
well_spacing    = 31;   // mm between well centers within a row — must
                         // exceed well_dia (27.5mm at current
                         // bottle_diameter + well_clearance) or
                         // adjacent wells merge into one trough, same
                         // constraint as the original single-row file.
row_divider     = 3.5;  // mm of solid wall between the front and back
                         // well rows — matches the within-row divider
                         // thickness (well_spacing - well_dia) for a
                         // consistent wall thickness throughout.
front_collar_height = 25;  // unchanged — the one number that's already
                             // physically fit-tested, from the original
                             // single-row bottle_row print.
row_step        = 20;   // mm — DECIDED, NOT measured. How much taller
                         // the back row's collar is than the front
                         // row's, so a back-row bottle's label clears a
                         // front-row bottle's shoulder/cap. Adjust
                         // after a physical fit-test, same provenance
                         // convention as front_collar_height itself.
back_collar_height  = front_collar_height + row_step;
well_angle      = 8;    // degrees, both rows tilted back the same
                         // amount — unchanged from the single-row file.
well_dia        = bottle_diameter + 2*well_clearance;
row_margin      = (footprint_y - 2*well_dia - row_divider) / 2;
front_row_y     = row_margin + well_dia/2;
back_row_y      = row_margin + well_dia + row_divider + well_dia/2;
row_split_y     = row_margin + well_dia + row_divider/2;  // where the
                         // front and back collar blocks meet — splits
                         // the divider wall evenly between them.
total_height    = base_plinth_height + back_collar_height;

module bottle_well(x, y, collar_h) {
    // Starts 1mm below the plinth top (clean CSG fusion, same overcut
    // convention as lib/connector.scad) and punches generously past
    // this row's own collar top so the well is genuinely open, not a
    // sealed pocket — the 8deg tilt eats a little of the nominal
    // height, this margin absorbs that rather than computing the exact
    // cosine.
    translate([x, y, base_plinth_height])
        rotate([well_angle, 0, 0])
            translate([0, 0, -1])
                cylinder(h=collar_h + 5, d=well_dia, $fn=48);
}

difference() {
    union() {
        base_plinth(footprint_x, footprint_y, base_plinth_height);
        translate([footprint_x, 0, 0])
            edge_tab(footprint_y, width=tab_width, depth=tab_depth, height=base_plinth_height);
        translate([0, 0, base_plinth_height])
            cube([footprint_x, row_split_y, front_collar_height]);
        translate([0, row_split_y, base_plinth_height])
            cube([footprint_x, footprint_y - row_split_y, back_collar_height]);
    }
    edge_slot(footprint_y, width=tab_width, depth=tab_depth, height=base_plinth_height, clearance=tab_clearance);
    for (i = [0:3]) {
        bottle_well(20 + i * well_spacing, front_row_y, front_collar_height);
        bottle_well(20 + i * well_spacing, back_row_y, back_collar_height);
    }
}
